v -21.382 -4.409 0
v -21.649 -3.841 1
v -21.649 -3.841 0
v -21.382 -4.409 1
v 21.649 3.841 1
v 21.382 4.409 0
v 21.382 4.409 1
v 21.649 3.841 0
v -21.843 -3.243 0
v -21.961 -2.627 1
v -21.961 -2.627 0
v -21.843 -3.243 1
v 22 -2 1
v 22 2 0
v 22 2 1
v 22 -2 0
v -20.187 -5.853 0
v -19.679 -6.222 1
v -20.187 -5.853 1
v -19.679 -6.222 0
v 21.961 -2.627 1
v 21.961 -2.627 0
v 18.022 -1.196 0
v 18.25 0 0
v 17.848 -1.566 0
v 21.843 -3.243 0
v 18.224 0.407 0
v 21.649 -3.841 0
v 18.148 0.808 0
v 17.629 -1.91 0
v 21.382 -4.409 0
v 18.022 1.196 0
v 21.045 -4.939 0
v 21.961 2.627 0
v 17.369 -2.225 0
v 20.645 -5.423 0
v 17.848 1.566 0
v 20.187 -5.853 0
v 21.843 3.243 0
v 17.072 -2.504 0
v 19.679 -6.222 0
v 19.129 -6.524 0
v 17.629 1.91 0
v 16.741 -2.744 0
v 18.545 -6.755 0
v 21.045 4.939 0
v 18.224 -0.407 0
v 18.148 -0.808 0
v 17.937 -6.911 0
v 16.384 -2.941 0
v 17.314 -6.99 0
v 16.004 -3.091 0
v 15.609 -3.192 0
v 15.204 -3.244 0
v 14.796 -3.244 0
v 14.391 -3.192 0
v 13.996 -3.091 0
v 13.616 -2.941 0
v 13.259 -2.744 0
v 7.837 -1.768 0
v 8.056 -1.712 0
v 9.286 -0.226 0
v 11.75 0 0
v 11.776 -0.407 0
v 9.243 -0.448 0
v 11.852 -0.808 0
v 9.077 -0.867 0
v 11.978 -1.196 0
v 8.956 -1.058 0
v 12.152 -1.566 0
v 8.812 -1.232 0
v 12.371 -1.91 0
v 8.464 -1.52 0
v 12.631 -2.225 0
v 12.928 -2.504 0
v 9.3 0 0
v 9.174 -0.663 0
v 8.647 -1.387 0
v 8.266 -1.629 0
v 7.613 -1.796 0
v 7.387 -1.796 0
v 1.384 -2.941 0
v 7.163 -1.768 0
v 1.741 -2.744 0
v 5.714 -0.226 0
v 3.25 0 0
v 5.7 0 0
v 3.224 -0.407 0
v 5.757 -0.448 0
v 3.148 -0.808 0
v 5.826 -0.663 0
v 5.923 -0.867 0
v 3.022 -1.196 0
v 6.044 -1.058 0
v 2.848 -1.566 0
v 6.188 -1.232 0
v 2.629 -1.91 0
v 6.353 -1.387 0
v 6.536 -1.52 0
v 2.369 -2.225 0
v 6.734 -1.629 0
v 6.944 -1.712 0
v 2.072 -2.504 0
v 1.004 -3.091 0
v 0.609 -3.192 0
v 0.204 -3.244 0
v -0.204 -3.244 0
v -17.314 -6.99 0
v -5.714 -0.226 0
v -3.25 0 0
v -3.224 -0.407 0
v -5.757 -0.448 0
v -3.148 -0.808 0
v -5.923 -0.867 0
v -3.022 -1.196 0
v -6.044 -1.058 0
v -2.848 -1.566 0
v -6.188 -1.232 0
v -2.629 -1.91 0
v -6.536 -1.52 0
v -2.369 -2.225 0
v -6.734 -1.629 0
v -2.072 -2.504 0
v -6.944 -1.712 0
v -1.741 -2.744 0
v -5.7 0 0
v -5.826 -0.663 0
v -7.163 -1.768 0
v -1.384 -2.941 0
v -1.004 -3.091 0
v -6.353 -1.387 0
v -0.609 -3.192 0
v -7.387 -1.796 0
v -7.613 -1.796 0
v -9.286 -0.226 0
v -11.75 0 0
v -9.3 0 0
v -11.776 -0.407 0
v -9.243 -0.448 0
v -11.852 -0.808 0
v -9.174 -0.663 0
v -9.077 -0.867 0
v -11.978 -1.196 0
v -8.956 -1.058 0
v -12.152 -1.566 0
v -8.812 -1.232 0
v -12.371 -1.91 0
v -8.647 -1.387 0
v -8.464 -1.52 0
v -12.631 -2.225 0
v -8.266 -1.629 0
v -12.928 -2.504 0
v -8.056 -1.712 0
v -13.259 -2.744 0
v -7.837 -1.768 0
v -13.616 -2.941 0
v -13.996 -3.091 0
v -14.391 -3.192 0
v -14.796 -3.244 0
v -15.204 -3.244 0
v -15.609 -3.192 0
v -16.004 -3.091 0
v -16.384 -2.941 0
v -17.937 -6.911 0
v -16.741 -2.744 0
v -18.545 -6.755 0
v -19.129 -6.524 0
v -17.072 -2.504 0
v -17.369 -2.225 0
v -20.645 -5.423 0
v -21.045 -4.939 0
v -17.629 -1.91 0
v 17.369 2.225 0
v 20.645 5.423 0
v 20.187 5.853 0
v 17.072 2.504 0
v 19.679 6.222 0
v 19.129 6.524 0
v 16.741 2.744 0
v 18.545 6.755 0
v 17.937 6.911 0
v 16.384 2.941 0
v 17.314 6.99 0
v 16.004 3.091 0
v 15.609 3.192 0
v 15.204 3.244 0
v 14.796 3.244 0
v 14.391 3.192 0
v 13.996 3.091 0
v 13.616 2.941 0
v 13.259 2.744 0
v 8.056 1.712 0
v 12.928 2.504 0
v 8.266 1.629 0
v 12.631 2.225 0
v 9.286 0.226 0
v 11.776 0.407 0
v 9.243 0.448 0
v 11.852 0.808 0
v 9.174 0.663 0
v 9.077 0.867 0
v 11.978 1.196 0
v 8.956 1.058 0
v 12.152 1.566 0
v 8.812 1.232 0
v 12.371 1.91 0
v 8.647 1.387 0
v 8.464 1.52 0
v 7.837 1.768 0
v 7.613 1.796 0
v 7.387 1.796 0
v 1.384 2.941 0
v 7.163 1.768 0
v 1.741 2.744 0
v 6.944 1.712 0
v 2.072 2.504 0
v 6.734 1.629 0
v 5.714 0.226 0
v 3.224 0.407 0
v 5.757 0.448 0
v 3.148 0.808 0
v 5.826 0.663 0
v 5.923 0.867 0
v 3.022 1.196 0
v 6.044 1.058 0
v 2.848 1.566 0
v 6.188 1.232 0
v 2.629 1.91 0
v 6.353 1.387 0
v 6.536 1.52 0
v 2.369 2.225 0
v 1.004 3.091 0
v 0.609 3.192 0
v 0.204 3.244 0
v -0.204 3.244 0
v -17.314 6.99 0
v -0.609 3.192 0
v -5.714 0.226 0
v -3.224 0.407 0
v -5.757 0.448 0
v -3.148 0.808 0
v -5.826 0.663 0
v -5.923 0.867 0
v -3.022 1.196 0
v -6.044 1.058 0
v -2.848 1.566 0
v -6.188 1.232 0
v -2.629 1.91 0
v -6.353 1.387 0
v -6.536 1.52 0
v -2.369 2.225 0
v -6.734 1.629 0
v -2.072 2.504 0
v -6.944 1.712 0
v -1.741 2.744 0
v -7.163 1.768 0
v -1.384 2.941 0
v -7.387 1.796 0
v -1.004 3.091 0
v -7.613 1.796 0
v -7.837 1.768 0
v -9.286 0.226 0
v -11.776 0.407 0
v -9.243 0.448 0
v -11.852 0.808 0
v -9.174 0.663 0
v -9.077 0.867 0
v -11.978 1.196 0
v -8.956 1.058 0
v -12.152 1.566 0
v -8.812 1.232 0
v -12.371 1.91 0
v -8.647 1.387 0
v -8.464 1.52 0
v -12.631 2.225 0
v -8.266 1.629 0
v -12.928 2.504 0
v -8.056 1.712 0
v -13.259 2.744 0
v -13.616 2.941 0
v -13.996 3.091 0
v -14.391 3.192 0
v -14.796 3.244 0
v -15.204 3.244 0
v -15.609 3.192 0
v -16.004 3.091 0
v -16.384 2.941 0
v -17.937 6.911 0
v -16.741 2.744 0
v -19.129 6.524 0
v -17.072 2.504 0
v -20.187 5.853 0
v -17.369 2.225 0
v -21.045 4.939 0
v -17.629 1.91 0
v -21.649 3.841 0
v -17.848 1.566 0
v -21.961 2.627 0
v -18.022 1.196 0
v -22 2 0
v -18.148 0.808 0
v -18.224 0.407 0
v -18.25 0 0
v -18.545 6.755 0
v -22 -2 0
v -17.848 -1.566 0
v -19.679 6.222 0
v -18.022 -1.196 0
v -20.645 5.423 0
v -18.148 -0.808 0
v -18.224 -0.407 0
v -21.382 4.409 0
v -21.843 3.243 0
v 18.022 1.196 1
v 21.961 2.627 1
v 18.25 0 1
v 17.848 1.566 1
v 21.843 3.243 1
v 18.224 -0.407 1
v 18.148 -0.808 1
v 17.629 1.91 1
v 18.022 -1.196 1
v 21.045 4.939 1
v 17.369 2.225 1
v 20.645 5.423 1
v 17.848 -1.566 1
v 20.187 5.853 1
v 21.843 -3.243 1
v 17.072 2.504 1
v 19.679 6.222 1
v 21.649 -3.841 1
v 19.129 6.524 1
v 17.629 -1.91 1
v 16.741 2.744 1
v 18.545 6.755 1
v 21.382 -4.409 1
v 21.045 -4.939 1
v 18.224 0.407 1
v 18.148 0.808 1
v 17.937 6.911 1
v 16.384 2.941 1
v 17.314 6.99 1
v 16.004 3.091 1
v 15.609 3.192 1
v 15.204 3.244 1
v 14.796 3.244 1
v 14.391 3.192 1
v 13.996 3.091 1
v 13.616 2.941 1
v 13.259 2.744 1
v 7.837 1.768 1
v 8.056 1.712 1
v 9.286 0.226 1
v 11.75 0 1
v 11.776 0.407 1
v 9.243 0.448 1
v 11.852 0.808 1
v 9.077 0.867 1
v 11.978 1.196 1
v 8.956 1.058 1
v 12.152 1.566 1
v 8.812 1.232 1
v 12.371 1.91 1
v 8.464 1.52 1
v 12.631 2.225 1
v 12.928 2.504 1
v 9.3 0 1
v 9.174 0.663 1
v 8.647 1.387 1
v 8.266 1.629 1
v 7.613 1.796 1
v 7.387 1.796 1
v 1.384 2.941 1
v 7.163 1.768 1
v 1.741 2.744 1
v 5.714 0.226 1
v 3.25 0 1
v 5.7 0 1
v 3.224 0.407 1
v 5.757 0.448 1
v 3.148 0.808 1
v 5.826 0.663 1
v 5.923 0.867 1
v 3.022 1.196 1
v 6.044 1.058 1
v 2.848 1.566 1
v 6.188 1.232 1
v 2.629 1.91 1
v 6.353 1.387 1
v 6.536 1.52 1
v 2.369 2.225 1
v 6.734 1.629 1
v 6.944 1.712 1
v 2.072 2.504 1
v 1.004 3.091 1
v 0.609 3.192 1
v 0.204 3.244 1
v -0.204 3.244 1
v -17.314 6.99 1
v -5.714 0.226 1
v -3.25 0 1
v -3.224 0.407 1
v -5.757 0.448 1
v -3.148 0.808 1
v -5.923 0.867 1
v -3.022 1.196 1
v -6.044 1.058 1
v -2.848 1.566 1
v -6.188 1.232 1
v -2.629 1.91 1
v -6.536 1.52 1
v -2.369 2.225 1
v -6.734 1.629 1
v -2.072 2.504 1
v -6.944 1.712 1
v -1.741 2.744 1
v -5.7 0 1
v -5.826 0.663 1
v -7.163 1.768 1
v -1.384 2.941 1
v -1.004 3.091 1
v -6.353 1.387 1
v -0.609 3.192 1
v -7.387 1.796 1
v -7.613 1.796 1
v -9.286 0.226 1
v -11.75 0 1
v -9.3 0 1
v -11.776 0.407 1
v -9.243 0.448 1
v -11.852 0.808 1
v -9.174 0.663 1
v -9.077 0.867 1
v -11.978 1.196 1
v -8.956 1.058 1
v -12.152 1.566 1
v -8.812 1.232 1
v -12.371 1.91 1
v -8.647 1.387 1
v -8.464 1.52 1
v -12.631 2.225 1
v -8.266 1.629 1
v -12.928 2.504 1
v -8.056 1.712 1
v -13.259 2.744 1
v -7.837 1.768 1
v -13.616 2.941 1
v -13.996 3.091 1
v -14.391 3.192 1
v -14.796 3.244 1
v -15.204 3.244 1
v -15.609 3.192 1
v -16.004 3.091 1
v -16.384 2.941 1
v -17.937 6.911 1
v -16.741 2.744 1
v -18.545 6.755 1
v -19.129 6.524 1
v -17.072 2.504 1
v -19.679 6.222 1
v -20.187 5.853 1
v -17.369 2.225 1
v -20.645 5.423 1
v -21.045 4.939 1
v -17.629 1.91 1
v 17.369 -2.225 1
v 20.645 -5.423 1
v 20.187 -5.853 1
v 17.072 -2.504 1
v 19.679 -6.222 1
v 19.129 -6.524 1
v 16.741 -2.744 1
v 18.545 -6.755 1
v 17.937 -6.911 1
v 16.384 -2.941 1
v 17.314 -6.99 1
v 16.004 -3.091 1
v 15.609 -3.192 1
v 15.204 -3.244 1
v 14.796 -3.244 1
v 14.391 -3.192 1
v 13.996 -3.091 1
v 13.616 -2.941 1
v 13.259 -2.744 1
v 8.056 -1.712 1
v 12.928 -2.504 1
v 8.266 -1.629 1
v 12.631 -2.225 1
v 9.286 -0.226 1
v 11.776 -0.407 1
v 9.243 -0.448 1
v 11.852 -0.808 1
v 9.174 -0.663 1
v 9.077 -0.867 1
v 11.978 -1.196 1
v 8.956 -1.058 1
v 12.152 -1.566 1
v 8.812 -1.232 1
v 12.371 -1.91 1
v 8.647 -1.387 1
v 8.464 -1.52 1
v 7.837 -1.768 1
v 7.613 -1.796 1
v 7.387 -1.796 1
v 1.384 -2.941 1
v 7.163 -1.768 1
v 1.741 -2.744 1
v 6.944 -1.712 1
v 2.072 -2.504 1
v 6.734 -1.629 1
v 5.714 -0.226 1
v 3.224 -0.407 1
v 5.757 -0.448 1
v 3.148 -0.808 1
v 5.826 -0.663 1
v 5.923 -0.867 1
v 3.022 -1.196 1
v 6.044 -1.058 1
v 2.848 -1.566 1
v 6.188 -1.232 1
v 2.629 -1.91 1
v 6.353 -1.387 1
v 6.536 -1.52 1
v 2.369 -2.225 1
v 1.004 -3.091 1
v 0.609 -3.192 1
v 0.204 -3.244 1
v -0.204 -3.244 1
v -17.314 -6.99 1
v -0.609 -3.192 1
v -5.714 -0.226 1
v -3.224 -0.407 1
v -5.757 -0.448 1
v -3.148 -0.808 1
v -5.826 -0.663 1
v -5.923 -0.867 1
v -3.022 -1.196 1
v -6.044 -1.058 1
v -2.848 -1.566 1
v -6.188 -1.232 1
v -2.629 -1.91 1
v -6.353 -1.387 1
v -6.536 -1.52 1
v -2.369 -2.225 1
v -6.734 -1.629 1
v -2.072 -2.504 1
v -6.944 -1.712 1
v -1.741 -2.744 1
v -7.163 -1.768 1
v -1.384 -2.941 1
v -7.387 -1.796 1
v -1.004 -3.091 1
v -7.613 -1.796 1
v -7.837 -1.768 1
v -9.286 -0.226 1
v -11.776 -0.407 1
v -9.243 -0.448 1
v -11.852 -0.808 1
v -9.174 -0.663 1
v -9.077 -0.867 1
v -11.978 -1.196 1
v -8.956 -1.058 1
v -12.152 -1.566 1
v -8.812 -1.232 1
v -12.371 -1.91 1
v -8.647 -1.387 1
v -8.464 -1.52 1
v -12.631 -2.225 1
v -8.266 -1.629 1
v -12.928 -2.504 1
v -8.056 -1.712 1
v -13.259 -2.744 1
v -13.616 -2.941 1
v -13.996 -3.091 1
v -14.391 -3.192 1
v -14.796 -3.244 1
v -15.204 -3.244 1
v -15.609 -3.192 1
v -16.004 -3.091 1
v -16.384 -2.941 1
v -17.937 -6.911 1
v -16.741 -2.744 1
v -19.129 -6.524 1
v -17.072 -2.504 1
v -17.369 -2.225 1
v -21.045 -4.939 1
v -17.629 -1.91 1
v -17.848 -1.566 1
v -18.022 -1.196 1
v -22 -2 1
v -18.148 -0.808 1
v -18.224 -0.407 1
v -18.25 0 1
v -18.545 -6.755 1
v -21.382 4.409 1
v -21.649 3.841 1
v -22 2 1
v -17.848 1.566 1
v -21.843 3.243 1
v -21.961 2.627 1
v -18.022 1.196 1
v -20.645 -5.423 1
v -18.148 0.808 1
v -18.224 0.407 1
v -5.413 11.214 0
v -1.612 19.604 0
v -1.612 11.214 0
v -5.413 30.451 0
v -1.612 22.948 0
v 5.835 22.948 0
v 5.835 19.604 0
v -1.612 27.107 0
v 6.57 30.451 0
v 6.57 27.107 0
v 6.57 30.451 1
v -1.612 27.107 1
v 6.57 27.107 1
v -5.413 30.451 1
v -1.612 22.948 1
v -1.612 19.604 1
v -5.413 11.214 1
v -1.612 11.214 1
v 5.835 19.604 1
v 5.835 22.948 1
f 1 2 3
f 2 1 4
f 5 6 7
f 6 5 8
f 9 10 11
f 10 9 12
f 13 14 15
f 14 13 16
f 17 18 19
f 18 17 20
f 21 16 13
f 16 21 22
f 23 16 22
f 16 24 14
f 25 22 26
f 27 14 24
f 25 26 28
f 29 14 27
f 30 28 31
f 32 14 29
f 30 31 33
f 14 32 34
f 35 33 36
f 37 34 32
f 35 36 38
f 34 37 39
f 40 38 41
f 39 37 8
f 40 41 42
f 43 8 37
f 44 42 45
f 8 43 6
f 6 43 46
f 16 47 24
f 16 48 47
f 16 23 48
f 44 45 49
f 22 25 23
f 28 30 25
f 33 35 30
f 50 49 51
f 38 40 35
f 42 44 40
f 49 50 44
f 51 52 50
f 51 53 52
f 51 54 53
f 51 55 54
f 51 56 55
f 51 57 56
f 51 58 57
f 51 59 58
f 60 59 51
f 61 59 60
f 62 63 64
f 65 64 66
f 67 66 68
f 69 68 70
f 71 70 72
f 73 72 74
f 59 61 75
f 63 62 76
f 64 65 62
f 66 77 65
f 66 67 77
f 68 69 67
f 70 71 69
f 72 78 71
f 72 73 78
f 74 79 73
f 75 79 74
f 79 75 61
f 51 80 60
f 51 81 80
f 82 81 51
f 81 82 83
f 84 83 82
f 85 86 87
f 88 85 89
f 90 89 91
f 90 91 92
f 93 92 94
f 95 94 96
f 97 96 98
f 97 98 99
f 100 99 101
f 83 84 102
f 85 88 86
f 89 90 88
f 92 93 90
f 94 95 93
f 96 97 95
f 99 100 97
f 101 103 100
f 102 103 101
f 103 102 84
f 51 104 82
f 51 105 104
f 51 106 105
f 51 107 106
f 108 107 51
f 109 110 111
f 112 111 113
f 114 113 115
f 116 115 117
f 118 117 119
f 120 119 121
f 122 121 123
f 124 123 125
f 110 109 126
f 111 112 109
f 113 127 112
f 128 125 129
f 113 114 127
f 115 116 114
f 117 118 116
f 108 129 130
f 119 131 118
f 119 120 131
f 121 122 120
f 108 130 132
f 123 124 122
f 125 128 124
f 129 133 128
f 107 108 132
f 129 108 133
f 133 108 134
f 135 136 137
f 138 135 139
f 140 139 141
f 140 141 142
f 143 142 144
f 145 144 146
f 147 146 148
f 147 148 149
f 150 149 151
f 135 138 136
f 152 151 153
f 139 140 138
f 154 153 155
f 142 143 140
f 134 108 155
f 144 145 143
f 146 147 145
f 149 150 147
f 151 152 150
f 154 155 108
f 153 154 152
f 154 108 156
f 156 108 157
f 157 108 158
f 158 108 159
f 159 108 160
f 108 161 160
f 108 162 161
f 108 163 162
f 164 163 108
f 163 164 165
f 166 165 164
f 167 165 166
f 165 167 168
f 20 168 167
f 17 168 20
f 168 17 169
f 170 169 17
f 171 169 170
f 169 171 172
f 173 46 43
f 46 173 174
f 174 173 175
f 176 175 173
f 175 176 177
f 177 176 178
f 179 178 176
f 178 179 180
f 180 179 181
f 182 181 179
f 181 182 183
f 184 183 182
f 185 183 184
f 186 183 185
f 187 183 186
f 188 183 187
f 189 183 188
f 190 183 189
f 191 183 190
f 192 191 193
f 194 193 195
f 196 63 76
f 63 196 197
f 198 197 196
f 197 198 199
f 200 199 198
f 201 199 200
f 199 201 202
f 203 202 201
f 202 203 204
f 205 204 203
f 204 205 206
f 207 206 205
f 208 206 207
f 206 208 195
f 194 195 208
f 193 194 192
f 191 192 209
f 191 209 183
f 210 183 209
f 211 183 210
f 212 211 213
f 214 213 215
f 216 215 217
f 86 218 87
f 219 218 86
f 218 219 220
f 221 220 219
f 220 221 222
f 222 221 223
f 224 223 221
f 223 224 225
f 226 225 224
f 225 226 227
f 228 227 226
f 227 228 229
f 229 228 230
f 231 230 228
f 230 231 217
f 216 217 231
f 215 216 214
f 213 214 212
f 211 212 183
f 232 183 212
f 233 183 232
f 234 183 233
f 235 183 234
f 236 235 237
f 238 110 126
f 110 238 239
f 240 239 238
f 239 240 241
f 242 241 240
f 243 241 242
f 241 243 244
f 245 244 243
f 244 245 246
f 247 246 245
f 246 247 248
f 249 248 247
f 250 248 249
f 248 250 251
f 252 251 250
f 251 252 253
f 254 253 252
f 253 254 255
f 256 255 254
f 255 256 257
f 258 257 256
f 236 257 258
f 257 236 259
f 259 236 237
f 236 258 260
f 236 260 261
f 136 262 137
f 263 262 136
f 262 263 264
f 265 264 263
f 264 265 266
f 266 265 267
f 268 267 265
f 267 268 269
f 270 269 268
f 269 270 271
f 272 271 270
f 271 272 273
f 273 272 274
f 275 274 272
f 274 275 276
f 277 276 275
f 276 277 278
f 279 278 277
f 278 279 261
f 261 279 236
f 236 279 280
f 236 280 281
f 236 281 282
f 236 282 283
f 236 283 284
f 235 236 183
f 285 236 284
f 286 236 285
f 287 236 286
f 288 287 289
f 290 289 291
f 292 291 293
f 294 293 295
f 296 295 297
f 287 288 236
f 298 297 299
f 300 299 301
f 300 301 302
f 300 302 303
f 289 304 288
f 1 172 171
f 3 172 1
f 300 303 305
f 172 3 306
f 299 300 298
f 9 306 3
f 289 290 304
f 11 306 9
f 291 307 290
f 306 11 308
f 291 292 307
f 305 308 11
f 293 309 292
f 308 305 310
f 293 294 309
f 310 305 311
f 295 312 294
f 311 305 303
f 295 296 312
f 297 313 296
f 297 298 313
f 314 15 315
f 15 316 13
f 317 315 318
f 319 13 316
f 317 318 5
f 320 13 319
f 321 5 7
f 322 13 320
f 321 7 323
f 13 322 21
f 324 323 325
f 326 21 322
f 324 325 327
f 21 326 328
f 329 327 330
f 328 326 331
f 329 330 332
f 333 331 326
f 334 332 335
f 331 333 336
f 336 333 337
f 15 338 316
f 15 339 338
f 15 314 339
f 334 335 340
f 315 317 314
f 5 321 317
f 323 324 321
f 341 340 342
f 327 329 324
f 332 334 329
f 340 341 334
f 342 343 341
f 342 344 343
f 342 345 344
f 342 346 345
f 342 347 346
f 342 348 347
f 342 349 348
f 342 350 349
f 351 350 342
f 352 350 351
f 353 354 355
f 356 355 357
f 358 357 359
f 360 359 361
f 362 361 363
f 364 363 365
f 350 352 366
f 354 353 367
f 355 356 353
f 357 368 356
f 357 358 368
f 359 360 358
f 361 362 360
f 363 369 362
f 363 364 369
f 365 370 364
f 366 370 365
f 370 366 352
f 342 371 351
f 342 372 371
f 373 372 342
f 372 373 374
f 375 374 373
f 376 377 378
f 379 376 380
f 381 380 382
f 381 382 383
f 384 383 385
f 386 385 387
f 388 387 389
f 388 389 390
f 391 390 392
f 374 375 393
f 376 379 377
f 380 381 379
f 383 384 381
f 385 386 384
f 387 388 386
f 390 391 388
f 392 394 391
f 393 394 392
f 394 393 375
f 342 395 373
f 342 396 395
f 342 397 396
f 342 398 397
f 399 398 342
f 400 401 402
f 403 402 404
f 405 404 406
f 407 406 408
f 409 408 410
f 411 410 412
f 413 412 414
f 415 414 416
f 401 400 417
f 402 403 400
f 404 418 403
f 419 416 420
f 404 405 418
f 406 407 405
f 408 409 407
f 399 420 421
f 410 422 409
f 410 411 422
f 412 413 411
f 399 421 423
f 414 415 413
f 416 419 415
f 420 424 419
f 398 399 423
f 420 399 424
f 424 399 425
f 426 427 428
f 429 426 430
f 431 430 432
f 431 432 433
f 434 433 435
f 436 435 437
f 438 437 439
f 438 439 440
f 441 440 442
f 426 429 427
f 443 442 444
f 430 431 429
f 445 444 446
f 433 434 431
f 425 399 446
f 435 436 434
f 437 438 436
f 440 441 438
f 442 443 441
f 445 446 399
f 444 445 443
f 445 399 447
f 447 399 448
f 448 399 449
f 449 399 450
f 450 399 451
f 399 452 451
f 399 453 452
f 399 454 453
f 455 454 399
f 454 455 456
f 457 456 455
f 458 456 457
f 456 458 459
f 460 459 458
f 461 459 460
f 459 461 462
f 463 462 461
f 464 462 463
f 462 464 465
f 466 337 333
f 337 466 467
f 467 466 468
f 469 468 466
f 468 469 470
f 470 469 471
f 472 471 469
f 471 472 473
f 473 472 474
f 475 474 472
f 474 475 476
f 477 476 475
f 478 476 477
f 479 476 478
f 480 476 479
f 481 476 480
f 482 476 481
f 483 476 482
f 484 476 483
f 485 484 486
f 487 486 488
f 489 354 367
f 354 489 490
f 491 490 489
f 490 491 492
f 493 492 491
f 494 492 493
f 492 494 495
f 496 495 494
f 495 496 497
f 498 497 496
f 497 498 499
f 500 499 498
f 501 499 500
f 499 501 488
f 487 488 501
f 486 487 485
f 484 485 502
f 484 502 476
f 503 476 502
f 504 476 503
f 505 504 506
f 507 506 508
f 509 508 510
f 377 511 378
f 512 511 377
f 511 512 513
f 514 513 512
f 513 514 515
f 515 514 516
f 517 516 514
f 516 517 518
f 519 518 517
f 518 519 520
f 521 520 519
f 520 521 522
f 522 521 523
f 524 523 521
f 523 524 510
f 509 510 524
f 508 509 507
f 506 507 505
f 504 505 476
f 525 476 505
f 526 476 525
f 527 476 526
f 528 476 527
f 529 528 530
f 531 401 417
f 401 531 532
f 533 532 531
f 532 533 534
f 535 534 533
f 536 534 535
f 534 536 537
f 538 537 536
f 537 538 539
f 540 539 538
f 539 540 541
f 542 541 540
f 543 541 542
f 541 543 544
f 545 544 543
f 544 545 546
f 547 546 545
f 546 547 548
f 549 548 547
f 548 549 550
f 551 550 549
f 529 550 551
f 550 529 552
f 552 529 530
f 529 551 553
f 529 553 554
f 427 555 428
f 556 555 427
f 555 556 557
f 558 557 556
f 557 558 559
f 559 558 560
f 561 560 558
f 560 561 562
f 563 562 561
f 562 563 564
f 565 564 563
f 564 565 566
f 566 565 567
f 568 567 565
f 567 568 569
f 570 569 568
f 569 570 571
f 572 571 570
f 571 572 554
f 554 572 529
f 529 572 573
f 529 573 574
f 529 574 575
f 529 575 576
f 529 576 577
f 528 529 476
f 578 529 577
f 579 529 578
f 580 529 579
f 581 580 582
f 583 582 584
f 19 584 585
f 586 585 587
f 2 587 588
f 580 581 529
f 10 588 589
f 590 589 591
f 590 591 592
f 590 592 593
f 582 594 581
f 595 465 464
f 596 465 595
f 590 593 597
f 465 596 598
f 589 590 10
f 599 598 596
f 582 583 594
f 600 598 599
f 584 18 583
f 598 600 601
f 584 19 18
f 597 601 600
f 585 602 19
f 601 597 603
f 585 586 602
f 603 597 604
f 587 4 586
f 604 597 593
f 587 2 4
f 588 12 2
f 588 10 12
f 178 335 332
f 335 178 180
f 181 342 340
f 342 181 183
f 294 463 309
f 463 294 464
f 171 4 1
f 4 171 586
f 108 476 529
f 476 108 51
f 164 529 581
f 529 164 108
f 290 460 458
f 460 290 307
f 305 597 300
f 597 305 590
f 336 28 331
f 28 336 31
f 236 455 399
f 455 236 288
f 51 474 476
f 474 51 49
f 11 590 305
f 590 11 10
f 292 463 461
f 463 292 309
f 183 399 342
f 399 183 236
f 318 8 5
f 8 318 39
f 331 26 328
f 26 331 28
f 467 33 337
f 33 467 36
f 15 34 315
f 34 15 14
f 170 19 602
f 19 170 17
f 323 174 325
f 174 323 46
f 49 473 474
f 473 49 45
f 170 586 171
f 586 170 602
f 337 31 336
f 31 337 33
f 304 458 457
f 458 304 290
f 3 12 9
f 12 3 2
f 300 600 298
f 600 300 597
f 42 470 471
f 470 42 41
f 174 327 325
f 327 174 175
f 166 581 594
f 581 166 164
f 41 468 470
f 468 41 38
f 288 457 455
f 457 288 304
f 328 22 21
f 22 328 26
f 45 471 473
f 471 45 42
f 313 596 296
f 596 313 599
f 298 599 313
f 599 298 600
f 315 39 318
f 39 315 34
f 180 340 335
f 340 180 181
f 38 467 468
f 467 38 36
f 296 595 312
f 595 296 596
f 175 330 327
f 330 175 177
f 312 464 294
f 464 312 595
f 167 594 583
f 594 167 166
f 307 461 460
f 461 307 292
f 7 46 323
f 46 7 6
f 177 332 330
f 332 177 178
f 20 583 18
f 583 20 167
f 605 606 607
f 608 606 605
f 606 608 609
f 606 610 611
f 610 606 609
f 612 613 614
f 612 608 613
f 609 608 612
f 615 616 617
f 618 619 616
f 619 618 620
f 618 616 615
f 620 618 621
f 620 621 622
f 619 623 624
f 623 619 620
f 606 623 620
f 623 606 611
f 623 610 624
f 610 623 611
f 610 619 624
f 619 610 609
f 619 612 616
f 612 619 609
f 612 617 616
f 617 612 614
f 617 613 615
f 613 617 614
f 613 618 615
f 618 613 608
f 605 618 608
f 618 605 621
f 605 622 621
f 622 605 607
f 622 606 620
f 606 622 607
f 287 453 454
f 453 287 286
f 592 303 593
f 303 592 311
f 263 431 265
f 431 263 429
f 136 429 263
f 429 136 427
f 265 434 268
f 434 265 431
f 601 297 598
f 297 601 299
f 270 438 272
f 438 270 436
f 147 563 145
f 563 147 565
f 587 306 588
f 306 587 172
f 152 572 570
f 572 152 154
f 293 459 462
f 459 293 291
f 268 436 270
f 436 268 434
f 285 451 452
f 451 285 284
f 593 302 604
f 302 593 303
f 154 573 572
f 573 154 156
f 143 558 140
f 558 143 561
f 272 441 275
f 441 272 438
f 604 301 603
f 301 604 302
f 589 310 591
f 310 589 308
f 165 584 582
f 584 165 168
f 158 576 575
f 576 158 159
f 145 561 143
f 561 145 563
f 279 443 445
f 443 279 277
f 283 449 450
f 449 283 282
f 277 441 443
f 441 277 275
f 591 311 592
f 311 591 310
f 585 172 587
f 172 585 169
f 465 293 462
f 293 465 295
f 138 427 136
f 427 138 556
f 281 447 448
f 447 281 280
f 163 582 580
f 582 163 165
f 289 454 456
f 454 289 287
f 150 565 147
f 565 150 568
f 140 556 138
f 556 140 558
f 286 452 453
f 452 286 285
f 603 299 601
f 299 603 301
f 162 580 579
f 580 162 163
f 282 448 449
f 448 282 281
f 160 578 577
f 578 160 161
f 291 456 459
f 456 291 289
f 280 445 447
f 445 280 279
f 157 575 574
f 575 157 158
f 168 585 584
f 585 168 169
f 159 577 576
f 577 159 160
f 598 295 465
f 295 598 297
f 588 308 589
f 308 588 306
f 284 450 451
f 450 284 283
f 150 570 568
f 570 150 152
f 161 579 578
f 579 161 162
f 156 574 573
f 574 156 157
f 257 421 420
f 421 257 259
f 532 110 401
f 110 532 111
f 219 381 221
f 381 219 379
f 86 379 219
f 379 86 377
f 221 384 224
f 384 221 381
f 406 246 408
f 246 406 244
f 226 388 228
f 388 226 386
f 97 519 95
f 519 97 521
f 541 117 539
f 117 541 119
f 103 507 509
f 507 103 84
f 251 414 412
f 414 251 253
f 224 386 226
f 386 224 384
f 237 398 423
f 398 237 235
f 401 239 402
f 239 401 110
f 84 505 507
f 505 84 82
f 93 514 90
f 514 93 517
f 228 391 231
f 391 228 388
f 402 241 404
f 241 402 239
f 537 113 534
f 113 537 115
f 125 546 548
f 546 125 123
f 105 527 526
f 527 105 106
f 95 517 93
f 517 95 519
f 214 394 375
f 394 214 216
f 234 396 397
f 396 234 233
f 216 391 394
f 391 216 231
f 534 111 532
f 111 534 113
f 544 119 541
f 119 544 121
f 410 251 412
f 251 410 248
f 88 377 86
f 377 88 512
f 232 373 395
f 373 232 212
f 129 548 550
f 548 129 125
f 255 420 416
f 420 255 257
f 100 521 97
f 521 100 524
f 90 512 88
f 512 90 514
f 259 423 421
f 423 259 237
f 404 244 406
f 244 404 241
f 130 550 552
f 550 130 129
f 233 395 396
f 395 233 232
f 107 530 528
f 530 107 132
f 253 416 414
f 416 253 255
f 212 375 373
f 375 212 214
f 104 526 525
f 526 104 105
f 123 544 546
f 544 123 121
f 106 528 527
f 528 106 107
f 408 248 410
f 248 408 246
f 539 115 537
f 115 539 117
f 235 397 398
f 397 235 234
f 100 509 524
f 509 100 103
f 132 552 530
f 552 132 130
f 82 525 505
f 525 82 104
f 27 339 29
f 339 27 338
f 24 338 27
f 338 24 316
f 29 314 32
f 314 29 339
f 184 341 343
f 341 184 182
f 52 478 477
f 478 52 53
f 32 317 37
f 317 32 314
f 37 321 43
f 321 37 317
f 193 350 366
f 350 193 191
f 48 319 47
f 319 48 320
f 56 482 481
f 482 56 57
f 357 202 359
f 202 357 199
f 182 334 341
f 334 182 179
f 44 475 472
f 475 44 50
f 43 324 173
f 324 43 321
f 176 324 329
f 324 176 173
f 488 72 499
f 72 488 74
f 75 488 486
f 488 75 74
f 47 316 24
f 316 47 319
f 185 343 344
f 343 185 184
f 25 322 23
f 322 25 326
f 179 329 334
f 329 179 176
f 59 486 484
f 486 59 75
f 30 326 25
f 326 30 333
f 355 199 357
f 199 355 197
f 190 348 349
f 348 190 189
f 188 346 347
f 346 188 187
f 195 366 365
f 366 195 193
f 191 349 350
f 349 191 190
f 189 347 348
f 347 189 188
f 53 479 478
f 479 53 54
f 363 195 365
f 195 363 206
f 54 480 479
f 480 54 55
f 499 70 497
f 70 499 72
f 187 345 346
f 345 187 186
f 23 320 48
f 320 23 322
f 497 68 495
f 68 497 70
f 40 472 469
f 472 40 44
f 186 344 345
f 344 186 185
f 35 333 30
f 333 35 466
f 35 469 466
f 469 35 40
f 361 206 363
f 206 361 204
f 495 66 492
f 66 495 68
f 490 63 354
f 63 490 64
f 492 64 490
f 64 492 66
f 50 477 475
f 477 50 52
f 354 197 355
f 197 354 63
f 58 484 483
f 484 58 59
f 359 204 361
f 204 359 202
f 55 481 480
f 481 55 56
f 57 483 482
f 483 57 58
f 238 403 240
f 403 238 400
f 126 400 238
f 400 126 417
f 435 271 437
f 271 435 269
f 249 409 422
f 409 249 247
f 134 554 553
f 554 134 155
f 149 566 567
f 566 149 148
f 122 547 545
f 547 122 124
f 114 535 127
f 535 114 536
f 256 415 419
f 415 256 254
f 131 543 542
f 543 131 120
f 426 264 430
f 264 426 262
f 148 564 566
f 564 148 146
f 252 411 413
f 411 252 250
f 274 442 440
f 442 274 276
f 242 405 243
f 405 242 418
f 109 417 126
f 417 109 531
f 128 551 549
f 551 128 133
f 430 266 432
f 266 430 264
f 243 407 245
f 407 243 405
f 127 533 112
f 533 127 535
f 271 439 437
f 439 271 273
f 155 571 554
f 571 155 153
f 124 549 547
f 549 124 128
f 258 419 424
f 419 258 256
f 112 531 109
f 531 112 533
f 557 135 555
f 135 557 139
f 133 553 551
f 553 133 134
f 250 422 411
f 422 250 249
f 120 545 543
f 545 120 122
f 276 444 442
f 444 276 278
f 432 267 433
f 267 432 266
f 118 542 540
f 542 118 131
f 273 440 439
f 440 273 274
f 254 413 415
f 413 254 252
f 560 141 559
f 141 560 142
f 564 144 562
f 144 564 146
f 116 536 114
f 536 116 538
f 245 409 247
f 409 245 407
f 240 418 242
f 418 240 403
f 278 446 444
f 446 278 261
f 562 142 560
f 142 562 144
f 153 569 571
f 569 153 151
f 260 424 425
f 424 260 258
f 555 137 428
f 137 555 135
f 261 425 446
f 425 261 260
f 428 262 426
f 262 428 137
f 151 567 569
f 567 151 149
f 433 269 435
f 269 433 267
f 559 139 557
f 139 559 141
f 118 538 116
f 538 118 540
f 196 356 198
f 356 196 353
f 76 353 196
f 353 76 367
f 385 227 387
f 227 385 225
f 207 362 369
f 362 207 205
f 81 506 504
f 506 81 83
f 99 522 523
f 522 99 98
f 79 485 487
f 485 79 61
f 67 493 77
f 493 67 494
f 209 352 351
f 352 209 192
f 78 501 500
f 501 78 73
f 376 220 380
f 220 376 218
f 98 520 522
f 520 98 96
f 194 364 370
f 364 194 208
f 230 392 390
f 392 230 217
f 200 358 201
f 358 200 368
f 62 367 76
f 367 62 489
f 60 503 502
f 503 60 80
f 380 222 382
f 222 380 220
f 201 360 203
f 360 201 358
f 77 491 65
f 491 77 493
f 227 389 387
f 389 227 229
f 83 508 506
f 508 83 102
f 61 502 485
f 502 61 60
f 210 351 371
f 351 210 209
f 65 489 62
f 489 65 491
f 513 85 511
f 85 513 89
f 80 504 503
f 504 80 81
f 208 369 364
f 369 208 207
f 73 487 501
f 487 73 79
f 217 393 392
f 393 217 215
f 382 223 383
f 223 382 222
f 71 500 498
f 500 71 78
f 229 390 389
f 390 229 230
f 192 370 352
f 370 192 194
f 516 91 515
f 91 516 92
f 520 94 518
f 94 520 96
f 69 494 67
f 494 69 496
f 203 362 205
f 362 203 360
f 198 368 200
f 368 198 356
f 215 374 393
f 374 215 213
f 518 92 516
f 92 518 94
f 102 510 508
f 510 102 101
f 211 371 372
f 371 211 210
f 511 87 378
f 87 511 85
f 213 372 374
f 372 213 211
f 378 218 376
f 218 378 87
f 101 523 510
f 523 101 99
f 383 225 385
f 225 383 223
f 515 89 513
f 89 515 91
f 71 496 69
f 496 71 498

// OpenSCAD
$fn = 50;


difference() {
	union() {
		hull() {
			translate(v = [-17.0000000000, 2.0000000000, 0]) {
				cylinder(h = 1, r = 5);
			}
			translate(v = [17.0000000000, 2.0000000000, 0]) {
				cylinder(h = 1, r = 5);
			}
			translate(v = [-17.0000000000, -2.0000000000, 0]) {
				cylinder(h = 1, r = 5);
			}
			translate(v = [17.0000000000, -2.0000000000, 0]) {
				cylinder(h = 1, r = 5);
			}
		}
		translate(v = [0, 30.0000000000, 0]) {
			linear_extrude(height = 1) {
				text(font = "DejaVu Sans Mono:style=Bold", halign = "center", size = 19.0000000000, text = "F", valign = "top");
			}
		}
	}
	union() {
		translate(v = [-15.0000000000, 0.0000000000, 0]) {
			translate(v = [0, 0, -100]) {
				cylinder(h = 200, r = 3.2500000000);
			}
		}
		translate(v = [0, 0, -100]) {
			cylinder(h = 200, r = 3.2500000000);
		}
		translate(v = [15.0000000000, 0.0000000000, 0]) {
			translate(v = [0, 0, -100]) {
				cylinder(h = 200, r = 3.2500000000);
			}
		}
		translate(v = [-15.0000000000, 0.0000000000, 0]) {
			translate(v = [0, 0, -100]) {
				cylinder(h = 200, r = 1.8000000000);
			}
		}
		translate(v = [-7.5000000000, 0.0000000000, 0]) {
			translate(v = [0, 0, -100]) {
				cylinder(h = 200, r = 1.8000000000);
			}
		}
		translate(v = [0, 0, -100]) {
			cylinder(h = 200, r = 1.8000000000);
		}
		translate(v = [7.5000000000, 0.0000000000, 0]) {
			translate(v = [0, 0, -100]) {
				cylinder(h = 200, r = 1.8000000000);
			}
		}
		translate(v = [15.0000000000, 0.0000000000, 0]) {
			translate(v = [0, 0, -100]) {
				cylinder(h = 200, r = 1.8000000000);
			}
		}
	}
}
